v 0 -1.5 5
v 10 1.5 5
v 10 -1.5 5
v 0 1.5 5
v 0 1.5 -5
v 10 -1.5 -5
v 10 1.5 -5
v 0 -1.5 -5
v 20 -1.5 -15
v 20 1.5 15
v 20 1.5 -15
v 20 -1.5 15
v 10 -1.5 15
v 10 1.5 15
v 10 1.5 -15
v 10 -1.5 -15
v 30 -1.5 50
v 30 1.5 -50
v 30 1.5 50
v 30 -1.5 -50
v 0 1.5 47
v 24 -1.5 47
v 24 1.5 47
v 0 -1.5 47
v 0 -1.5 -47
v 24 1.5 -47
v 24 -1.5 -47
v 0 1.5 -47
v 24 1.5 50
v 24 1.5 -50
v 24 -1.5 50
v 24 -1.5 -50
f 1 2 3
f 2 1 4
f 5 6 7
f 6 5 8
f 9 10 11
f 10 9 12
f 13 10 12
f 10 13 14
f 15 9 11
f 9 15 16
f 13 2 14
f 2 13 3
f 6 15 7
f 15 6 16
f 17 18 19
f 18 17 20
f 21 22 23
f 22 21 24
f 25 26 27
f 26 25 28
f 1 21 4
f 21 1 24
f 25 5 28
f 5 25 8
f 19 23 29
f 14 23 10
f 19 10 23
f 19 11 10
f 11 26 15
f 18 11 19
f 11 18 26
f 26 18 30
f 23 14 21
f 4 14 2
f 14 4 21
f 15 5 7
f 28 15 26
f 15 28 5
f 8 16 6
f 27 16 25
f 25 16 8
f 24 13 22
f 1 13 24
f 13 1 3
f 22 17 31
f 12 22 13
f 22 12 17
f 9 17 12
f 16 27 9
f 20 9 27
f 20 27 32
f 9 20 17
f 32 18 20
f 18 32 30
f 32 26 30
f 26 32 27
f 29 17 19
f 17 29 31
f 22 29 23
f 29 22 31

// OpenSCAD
// file: wall-anchor.scad
/**
 * The anchor is the structure
 * on the back side of the box
 * which holds together the
 * two ends of the wall.
 */

include <measures.scad>;

module wall_anchor()
{
    // horizontal
    translate([
        anchor_length/2-nothing,
        0,
        0
        ])
    cube([
        anchor_length+nothing,
        material_z+nothing,
        anchor_width
        ], center=true);

    // vertical
    translate([
        +anchor_length-anchor_width/2,
        0,
        0
        ])
    cube([
        anchor_width,
        material_z+nothing,
        anchor_height
        ], center=true);
}

wall_anchor();
// file: wall-front.scad
include <measures.scad>;

module wall_noses(x)
{
    for (z=[
        -wall_z/2-nose_z/2,
        +wall_z/2+nose_z/2
        ])
    {
        translate([
            x,
            0,
            z
            ])
        cube([
            nose_x,
            material_z,
            nose_z
            ], center=true);
    }
}

module wall_noses_left()
{
    wall_noses(-rect_x/2+nose_x/2);
}

module wall_noses_right()
{
    wall_noses(+rect_x/2-nose_x/2);
}

module wall_front()
{
    // base material
    cube([
        rect_x,
        material_z,
        wall_z
        ], center=true);

    // noses to top and bottom
    wall_noses_left();
    wall_noses_right();
}

wall_front();
// file: measures.scad
/**
 * Pencil box configuration
 * All measures in millimeters
 */

// rendering parameters
$fn = 200;
nothing = 0.005;

// material to cut from
material_x = 350;
material_y = 180;
material_z = 3;

// total size of the box
box_x = 130;
box_y = 70;
box_z = 100;

// measures of the two half circles left and right
curvature_y = box_y;
curvature_x = curvature_y/2;

// measure of rectangle between half circles
rect_x = box_x - 2*curvature_x;
rect_y = box_y;

top_opening_inset = 5.7*material_z;

wall_z = box_z - 2*material_z;

// distance between wall and outer edge
wall_inset = material_z;

curve_radius = box_y/2 - wall_inset - material_z;
curve_length = curve_radius*PI;

// total wall length without anchor
wall_length = 2*rect_x + 2*curve_length;

// nose properties
nose_x = 2*material_z;
nose_z = material_z;

// anchor
anchor_width = 10;
anchor_height = 30;
anchor_length = 20;

// for preview
pillar_count = 20;
pillar_angle = 180 / (pillar_count-1);
pillar_width = 4;

part_spacing = 1;
// main file
include <measures.scad>;
use <wall-front.scad>;
use <wall-anchor.scad>;

module wall_nose()
{
    cube([
        nose_width,
        material_z,
        material_z
        ], center=true);
}

module wall_back_female()
{
    difference()
    {
        // base material
        translate([
            +rect_x/4,
            0,
            0
            ])
        cube([
            rect_x/2,
            material_z,
            wall_z
            ], center=true);

        wall_anchor();
    }

    // noses to top and bottom
    wall_noses_right();
}

wall_back_female();
